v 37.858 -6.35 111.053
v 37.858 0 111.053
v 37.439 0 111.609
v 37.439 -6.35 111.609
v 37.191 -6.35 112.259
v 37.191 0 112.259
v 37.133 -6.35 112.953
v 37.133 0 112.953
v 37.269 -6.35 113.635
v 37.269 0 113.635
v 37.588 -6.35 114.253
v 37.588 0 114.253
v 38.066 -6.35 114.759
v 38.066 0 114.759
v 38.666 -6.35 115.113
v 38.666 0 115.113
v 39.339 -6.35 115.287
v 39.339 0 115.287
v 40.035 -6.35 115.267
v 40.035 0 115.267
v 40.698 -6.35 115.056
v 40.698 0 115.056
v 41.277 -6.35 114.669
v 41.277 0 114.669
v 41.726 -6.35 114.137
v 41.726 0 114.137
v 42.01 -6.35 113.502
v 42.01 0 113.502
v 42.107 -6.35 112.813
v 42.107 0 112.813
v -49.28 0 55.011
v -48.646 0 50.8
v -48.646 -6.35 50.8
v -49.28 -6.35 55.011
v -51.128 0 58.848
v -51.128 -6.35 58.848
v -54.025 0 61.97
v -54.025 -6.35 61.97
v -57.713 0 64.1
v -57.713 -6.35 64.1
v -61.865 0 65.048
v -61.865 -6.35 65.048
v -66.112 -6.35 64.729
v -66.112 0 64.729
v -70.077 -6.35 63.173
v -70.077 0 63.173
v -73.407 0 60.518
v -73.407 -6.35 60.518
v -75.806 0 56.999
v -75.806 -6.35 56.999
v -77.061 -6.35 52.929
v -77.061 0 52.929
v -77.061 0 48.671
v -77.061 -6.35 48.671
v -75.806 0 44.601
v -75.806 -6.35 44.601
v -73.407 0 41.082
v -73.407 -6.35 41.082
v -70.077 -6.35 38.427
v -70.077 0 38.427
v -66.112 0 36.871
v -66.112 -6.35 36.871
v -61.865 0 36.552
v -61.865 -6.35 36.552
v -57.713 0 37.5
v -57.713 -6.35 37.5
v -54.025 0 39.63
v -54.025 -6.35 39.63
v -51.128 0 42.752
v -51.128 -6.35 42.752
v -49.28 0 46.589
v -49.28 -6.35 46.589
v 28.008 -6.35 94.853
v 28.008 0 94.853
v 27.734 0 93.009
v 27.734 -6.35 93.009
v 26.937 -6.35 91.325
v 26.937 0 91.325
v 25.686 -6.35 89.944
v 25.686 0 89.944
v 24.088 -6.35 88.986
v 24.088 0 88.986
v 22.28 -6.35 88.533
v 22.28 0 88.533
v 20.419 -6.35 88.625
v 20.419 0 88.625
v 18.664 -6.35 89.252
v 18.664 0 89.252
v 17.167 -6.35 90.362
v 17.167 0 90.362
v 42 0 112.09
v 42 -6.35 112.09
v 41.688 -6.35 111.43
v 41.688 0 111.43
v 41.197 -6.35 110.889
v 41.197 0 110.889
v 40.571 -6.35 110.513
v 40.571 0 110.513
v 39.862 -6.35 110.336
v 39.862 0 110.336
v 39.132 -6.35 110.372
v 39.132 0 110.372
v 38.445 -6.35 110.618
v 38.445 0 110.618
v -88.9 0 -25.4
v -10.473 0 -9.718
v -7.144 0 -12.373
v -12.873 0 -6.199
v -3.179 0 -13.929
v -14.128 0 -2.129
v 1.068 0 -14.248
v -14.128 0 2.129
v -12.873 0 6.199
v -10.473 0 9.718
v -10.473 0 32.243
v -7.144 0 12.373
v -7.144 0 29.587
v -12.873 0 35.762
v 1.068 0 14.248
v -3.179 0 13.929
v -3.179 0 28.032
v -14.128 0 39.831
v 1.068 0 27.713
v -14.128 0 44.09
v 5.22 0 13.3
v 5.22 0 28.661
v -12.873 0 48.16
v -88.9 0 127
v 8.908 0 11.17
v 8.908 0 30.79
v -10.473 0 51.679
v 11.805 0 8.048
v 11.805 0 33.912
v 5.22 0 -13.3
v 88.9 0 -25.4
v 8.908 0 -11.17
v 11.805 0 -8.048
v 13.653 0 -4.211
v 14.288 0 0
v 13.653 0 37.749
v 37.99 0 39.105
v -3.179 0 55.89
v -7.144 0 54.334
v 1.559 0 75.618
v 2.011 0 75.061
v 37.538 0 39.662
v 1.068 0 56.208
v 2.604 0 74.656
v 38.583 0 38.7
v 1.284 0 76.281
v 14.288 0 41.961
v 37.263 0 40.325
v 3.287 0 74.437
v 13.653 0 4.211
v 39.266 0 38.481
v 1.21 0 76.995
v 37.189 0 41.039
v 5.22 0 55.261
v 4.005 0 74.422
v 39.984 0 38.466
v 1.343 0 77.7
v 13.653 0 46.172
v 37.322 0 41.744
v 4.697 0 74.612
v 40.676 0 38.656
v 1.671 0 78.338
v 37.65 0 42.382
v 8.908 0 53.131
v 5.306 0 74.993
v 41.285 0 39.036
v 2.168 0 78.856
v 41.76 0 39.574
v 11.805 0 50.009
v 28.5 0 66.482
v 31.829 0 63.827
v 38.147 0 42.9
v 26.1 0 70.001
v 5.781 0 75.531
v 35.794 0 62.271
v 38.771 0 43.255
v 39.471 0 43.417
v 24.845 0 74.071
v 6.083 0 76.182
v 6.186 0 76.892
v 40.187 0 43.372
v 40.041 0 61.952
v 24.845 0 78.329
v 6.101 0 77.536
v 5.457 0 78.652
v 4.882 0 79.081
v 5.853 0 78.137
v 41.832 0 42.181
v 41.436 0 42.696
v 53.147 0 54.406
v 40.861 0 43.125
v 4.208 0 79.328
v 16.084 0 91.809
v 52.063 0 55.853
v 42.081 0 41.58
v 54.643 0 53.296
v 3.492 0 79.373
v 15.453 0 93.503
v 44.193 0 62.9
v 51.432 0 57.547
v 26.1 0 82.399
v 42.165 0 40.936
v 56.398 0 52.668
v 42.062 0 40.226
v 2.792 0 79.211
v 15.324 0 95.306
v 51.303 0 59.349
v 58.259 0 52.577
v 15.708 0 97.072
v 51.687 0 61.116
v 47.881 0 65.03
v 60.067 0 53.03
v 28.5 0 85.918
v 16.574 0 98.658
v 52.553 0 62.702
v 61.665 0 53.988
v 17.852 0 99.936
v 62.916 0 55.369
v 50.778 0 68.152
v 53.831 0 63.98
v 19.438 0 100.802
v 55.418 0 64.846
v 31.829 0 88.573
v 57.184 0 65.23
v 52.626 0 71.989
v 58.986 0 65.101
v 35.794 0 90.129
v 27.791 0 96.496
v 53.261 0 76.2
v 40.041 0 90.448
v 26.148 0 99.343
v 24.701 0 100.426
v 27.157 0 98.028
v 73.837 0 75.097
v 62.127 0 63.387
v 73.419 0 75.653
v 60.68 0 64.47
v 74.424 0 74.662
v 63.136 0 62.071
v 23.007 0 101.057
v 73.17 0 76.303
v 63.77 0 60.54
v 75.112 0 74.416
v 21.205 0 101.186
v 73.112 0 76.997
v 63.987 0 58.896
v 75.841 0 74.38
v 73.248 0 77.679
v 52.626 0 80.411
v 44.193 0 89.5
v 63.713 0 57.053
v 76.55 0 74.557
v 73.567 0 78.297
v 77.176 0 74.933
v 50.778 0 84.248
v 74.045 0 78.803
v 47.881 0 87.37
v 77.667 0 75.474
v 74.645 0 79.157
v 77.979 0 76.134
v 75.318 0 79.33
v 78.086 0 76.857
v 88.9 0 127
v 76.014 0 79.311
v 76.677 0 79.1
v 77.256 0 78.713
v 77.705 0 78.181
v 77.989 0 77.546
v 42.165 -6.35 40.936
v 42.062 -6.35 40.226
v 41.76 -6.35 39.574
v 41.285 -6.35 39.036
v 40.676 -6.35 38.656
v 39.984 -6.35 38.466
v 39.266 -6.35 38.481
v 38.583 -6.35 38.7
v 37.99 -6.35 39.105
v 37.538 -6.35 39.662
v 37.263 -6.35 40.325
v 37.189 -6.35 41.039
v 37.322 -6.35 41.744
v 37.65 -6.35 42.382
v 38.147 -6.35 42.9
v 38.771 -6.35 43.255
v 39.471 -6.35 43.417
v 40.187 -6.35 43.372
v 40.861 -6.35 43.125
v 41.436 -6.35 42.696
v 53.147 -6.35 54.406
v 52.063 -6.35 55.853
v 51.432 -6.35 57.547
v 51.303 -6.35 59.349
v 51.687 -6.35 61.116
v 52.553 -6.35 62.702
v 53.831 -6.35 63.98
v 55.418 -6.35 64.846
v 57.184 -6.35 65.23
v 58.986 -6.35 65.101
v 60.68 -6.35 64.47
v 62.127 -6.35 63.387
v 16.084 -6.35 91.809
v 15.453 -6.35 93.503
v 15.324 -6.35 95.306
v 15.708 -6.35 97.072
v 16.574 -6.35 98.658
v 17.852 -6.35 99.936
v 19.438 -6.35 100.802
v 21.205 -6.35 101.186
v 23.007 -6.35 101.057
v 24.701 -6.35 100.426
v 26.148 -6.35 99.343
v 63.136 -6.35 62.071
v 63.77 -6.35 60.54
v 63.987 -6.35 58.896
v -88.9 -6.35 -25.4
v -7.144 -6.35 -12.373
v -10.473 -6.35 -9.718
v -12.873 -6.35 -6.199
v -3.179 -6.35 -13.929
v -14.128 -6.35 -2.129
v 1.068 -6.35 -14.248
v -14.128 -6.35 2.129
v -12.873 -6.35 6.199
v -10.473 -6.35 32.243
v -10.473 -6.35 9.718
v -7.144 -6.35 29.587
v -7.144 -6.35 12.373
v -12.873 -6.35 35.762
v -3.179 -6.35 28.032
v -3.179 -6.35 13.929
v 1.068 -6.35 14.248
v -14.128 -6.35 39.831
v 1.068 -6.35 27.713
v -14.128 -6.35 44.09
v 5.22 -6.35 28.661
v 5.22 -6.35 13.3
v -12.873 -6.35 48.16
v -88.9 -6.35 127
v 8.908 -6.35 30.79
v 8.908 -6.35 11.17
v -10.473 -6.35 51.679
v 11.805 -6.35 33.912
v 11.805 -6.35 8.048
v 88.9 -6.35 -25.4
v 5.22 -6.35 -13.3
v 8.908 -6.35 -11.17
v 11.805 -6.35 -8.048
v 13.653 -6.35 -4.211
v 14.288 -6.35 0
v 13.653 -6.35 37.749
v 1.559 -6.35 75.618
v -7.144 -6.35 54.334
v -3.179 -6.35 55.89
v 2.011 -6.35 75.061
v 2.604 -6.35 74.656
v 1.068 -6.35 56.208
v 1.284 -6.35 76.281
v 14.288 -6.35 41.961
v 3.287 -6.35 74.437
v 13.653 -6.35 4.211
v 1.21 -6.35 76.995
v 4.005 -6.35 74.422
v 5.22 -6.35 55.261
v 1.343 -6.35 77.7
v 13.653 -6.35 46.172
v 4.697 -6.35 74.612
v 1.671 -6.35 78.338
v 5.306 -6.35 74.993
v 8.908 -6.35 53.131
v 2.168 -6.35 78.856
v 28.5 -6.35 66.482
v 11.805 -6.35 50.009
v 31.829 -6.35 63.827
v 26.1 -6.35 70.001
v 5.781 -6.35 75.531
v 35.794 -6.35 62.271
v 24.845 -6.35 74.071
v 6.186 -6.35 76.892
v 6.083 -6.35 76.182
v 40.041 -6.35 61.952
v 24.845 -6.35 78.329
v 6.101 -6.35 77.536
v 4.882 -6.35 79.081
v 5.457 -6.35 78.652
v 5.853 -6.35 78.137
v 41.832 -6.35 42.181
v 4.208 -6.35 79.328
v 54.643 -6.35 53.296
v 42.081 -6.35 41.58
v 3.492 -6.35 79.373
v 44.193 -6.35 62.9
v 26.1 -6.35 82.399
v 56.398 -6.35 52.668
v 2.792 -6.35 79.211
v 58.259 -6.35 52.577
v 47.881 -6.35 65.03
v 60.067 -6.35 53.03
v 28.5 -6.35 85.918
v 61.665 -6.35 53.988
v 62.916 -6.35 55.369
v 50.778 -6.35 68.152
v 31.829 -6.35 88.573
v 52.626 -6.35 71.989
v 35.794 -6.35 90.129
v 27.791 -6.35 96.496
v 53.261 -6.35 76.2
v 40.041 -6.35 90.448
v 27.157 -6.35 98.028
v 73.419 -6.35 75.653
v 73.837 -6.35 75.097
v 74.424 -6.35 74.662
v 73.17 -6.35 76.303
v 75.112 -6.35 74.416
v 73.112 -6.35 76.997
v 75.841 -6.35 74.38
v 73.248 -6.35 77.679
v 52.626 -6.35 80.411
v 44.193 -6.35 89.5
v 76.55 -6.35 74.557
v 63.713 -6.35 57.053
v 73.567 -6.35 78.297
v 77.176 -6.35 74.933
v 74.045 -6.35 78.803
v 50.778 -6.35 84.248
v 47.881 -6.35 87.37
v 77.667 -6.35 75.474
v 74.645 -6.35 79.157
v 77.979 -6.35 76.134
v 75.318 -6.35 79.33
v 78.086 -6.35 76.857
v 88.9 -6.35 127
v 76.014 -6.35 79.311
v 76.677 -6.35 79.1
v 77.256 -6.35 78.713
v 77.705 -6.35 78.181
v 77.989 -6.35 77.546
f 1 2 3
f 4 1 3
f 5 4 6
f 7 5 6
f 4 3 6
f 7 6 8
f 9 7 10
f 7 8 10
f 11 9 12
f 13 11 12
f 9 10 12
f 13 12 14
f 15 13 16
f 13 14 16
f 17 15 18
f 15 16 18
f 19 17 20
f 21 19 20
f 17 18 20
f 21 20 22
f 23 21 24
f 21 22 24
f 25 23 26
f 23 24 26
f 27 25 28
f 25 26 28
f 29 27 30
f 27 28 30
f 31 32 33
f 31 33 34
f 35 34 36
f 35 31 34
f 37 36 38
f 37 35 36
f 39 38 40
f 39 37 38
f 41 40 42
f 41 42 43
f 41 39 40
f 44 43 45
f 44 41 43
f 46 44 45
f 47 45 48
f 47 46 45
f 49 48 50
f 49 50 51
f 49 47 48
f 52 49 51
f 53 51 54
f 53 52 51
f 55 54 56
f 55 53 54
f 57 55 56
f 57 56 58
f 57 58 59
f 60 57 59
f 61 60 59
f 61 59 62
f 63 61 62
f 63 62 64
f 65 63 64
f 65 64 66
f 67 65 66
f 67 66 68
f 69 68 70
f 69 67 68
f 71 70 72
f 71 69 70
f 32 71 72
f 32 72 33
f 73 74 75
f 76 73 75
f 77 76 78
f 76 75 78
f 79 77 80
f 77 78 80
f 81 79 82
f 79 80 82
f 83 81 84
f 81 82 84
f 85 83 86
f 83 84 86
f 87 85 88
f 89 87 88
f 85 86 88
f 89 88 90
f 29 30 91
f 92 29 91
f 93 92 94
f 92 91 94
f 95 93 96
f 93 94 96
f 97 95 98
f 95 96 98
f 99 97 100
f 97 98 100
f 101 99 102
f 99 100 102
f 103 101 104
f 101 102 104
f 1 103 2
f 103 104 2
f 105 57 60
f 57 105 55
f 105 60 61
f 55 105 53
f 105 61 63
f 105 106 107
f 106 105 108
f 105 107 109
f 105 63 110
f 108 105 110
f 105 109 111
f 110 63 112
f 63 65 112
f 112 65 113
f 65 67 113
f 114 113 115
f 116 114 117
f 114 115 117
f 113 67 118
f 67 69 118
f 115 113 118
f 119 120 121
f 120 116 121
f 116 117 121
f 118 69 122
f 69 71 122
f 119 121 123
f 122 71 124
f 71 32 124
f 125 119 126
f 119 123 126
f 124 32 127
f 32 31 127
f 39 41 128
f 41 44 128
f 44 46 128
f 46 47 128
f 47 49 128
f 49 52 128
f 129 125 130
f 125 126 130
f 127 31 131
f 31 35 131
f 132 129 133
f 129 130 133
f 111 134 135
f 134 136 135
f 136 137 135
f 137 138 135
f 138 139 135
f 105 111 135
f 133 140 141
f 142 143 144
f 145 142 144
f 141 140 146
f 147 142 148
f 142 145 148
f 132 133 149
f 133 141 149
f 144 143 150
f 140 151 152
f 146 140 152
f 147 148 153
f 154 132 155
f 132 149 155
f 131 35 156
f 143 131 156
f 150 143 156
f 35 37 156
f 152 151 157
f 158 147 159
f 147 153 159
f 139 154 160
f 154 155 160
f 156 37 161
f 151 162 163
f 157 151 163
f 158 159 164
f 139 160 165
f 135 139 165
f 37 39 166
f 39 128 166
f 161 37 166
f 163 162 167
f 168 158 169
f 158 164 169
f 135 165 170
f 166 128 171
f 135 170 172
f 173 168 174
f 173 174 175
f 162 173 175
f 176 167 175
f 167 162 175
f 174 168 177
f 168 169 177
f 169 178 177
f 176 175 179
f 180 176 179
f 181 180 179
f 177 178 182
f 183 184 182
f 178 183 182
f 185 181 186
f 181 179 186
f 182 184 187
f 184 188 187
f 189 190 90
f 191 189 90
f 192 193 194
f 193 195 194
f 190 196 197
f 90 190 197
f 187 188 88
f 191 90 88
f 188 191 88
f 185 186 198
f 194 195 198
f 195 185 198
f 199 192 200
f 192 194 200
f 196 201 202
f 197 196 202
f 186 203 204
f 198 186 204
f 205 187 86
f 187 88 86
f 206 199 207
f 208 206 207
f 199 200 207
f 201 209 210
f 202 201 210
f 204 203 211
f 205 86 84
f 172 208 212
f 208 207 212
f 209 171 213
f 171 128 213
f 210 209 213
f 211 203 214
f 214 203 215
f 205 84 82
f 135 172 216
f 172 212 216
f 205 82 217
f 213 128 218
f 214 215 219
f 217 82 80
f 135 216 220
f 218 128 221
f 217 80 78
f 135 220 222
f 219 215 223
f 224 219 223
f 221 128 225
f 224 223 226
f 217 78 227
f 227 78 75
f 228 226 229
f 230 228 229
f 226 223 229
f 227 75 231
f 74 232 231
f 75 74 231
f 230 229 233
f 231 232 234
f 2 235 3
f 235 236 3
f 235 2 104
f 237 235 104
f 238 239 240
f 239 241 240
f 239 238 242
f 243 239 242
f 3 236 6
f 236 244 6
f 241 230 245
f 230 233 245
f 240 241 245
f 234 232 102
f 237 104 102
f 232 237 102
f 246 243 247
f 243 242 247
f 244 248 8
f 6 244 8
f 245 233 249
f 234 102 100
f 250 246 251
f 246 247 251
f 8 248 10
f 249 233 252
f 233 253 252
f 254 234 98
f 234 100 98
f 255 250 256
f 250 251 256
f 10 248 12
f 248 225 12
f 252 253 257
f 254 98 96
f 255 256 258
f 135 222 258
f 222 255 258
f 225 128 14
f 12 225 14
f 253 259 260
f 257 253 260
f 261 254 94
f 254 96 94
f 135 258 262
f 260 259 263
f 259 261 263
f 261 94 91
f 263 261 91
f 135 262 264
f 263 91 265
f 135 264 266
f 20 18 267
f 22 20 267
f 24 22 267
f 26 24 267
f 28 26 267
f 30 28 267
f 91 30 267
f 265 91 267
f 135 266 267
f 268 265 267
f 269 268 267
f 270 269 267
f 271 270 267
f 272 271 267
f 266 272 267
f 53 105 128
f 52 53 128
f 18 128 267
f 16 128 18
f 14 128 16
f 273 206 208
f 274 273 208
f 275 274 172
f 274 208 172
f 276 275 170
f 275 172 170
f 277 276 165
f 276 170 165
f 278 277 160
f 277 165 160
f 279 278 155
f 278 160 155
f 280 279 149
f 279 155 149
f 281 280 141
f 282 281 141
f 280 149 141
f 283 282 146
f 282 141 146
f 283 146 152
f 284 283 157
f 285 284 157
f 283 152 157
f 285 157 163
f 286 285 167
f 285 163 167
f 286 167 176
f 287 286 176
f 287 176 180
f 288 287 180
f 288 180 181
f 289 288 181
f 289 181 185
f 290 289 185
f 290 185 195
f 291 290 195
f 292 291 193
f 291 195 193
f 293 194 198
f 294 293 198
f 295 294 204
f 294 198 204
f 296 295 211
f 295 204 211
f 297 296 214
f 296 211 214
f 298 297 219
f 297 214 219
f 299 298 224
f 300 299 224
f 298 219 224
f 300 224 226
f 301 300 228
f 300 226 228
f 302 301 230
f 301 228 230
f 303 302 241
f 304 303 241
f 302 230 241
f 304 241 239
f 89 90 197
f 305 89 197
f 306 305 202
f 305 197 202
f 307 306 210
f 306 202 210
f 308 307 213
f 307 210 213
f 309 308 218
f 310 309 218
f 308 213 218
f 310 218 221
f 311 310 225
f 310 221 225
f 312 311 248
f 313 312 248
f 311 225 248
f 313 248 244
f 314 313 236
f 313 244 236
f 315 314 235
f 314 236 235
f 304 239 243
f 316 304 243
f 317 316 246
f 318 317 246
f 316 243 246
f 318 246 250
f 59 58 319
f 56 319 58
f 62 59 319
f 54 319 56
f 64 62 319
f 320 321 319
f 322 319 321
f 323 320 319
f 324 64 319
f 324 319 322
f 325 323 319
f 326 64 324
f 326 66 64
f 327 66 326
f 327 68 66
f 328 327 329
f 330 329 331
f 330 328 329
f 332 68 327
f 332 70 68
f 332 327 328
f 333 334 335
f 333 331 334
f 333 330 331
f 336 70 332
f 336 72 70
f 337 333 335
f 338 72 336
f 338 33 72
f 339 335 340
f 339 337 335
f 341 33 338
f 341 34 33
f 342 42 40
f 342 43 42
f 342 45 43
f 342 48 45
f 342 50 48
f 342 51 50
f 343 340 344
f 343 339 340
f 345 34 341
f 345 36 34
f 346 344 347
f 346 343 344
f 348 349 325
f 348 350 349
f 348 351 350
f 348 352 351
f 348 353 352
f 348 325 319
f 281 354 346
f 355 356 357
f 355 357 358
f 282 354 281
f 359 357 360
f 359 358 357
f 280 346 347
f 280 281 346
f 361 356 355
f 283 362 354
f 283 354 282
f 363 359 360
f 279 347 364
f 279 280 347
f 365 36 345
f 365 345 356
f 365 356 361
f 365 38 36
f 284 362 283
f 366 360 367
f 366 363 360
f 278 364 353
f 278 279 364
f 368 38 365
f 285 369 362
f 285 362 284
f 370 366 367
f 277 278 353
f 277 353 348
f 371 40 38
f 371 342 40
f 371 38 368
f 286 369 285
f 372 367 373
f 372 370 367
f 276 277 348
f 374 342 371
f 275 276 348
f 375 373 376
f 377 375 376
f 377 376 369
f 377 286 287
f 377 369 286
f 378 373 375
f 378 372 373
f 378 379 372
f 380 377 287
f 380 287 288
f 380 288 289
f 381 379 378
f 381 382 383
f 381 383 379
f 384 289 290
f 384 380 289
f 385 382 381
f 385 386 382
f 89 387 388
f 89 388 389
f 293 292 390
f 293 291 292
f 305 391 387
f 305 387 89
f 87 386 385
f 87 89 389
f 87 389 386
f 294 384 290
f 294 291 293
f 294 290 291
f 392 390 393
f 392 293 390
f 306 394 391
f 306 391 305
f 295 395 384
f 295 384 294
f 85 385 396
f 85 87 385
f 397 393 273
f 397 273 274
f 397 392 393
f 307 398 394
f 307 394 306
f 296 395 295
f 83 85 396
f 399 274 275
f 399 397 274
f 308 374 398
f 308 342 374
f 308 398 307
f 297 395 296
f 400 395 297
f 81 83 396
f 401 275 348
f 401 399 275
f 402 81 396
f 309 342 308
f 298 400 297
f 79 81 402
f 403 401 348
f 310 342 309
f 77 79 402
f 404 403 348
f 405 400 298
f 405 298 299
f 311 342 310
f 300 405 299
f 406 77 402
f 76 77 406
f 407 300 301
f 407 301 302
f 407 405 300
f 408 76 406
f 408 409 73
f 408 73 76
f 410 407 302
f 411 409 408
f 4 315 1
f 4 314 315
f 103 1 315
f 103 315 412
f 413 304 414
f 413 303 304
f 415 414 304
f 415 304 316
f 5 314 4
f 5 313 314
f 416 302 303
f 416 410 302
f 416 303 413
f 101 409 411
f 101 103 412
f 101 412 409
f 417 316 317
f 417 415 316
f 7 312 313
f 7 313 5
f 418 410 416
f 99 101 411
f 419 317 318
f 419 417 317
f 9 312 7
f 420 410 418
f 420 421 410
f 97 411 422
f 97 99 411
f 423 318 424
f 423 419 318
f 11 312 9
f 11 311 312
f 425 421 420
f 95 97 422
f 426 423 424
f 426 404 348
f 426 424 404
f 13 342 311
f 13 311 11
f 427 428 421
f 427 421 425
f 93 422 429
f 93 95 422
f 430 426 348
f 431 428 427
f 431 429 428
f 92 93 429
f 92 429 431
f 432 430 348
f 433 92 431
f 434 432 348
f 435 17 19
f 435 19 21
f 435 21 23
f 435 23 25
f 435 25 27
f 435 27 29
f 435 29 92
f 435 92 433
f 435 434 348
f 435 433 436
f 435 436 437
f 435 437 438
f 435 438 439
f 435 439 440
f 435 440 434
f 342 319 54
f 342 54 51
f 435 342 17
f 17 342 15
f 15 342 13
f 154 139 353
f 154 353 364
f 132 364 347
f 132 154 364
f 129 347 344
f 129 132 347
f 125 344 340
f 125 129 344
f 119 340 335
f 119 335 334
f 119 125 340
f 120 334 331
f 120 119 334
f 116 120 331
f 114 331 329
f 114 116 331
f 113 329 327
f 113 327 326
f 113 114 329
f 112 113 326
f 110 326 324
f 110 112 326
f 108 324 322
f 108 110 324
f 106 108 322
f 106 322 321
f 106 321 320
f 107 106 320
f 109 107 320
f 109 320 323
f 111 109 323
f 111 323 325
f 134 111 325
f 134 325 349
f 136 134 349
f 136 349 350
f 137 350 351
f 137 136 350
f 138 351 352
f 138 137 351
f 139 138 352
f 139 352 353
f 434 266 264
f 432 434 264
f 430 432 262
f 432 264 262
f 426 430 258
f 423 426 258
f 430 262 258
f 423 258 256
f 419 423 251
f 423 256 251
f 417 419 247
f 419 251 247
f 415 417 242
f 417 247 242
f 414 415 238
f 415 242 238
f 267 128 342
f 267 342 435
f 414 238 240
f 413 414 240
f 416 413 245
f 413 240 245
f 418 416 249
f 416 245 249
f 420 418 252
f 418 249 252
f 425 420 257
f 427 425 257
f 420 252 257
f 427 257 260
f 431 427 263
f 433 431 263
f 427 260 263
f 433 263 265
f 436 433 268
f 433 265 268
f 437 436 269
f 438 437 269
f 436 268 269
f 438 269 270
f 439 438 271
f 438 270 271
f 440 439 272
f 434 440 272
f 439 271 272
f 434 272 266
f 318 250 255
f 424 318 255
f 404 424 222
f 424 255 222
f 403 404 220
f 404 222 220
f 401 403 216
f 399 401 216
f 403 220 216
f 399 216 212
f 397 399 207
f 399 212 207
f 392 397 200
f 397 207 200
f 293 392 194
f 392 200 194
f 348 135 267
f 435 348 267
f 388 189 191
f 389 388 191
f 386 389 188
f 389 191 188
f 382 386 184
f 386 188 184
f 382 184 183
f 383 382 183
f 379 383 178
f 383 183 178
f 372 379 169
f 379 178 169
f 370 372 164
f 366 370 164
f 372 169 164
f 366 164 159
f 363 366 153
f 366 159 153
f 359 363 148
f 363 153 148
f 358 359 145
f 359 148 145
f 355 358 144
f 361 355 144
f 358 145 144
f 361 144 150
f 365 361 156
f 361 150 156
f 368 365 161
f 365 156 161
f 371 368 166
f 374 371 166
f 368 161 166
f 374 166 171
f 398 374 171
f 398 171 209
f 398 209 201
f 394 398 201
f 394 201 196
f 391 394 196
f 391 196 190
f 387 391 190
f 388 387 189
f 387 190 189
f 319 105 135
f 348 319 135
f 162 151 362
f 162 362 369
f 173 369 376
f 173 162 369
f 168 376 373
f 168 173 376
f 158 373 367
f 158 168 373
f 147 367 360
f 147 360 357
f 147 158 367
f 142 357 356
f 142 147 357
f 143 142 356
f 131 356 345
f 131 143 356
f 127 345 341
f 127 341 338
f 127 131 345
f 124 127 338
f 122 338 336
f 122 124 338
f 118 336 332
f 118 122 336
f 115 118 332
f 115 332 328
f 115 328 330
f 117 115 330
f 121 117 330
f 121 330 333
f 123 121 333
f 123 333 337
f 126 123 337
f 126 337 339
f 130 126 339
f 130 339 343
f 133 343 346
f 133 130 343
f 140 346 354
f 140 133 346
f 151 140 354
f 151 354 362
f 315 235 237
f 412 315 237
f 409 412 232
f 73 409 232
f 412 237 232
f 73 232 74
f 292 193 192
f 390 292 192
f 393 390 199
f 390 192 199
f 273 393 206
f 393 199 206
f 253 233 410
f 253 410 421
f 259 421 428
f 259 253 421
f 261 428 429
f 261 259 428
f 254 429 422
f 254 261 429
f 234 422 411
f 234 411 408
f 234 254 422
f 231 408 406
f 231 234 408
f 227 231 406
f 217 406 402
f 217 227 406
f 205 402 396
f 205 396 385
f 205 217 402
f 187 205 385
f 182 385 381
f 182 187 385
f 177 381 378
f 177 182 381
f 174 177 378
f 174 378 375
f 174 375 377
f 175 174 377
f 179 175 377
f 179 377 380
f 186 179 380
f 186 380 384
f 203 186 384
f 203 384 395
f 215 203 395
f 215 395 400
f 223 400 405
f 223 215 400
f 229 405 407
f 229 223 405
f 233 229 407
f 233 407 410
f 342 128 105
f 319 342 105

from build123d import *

# Parameters (mm, degrees)
F0_W     = 177.8
F0_H     = 101.6
F0_R     = 14.2875
F0_H_2   = 50.8
F1_DEPTH = 6.35


with BuildPart() as f1:
    # F0 (on Front) → F1 (new body)
    with BuildSketch(Plane.XZ):
        with Locations((0, 76.2)):
            Rectangle(F0_W, F0_H)
        with Locations((-62.933081, 50.8)):
            Circle(F0_R, mode=Mode.SUBTRACT)
        with Locations((0, 41.9608)):
            Circle(F0_R, mode=Mode.SUBTRACT)
        with BuildLine():
            ThreePointArc((42.165347, 40.935914), (37.376426, 39.983338), (41.436277, 42.696044))
            ThreePointArc((41.436277, 42.696044), (41.975868, 41.88849), (42.165347, 40.935914))
        make_face(mode=Mode.SUBTRACT)
        with BuildLine():
            ThreePointArc((6.186256, 76.892011), (1.397336, 75.939435), (5.457187, 78.652141))
            ThreePointArc((5.457187, 78.652141), (5.996777, 77.844587), (6.186256, 76.892011))
        make_face(mode=Mode.SUBTRACT)
        with Locations((38.97307, 76.2)):
            Circle(F0_R, mode=Mode.SUBTRACT)
        with BuildLine():
            ThreePointArc((62.126788, 63.386554), (63.503295, 61.326466), (63.98666, 58.896426))
            ThreePointArc((63.98666, 58.896426), (60.066699, 53.029791), (53.146531, 54.406298))
            ThreePointArc((53.146531, 54.406298), (53.146531, 63.386554), (62.126788, 63.386554))
        make_face(mode=Mode.SUBTRACT)
        with BuildLine():
            ThreePointArc((78.086372, 76.856938), (76.549747, 74.557218), (73.837042, 75.096808))
            ThreePointArc((73.837042, 75.096808), (74.644596, 79.156659), (78.086372, 76.856938))
        make_face(mode=Mode.SUBTRACT)
        with BuildLine():
            ThreePointArc((26.147697, 99.342651), (27.524204, 97.282563), (28.007569, 94.852523))
            ThreePointArc((28.007569, 94.852523), (24.087609, 88.985888), (17.167441, 90.362395))
            ThreePointArc((17.167441, 90.362395), (17.167441, 99.342651), (26.147697, 99.342651))
        make_face(mode=Mode.SUBTRACT)
        with BuildLine():
            ThreePointArc((42.107281, 112.813035), (40.570657, 110.513314), (37.857951, 111.052905))
            ThreePointArc((37.857951, 111.052905), (38.665505, 115.112756), (42.107281, 112.813035))
        make_face(mode=Mode.SUBTRACT)
        Rectangle(F0_W, F0_H_2)
        Circle(F0_R, mode=Mode.SUBTRACT)
    extrude(amount=F1_DEPTH)


solid = f1.part
